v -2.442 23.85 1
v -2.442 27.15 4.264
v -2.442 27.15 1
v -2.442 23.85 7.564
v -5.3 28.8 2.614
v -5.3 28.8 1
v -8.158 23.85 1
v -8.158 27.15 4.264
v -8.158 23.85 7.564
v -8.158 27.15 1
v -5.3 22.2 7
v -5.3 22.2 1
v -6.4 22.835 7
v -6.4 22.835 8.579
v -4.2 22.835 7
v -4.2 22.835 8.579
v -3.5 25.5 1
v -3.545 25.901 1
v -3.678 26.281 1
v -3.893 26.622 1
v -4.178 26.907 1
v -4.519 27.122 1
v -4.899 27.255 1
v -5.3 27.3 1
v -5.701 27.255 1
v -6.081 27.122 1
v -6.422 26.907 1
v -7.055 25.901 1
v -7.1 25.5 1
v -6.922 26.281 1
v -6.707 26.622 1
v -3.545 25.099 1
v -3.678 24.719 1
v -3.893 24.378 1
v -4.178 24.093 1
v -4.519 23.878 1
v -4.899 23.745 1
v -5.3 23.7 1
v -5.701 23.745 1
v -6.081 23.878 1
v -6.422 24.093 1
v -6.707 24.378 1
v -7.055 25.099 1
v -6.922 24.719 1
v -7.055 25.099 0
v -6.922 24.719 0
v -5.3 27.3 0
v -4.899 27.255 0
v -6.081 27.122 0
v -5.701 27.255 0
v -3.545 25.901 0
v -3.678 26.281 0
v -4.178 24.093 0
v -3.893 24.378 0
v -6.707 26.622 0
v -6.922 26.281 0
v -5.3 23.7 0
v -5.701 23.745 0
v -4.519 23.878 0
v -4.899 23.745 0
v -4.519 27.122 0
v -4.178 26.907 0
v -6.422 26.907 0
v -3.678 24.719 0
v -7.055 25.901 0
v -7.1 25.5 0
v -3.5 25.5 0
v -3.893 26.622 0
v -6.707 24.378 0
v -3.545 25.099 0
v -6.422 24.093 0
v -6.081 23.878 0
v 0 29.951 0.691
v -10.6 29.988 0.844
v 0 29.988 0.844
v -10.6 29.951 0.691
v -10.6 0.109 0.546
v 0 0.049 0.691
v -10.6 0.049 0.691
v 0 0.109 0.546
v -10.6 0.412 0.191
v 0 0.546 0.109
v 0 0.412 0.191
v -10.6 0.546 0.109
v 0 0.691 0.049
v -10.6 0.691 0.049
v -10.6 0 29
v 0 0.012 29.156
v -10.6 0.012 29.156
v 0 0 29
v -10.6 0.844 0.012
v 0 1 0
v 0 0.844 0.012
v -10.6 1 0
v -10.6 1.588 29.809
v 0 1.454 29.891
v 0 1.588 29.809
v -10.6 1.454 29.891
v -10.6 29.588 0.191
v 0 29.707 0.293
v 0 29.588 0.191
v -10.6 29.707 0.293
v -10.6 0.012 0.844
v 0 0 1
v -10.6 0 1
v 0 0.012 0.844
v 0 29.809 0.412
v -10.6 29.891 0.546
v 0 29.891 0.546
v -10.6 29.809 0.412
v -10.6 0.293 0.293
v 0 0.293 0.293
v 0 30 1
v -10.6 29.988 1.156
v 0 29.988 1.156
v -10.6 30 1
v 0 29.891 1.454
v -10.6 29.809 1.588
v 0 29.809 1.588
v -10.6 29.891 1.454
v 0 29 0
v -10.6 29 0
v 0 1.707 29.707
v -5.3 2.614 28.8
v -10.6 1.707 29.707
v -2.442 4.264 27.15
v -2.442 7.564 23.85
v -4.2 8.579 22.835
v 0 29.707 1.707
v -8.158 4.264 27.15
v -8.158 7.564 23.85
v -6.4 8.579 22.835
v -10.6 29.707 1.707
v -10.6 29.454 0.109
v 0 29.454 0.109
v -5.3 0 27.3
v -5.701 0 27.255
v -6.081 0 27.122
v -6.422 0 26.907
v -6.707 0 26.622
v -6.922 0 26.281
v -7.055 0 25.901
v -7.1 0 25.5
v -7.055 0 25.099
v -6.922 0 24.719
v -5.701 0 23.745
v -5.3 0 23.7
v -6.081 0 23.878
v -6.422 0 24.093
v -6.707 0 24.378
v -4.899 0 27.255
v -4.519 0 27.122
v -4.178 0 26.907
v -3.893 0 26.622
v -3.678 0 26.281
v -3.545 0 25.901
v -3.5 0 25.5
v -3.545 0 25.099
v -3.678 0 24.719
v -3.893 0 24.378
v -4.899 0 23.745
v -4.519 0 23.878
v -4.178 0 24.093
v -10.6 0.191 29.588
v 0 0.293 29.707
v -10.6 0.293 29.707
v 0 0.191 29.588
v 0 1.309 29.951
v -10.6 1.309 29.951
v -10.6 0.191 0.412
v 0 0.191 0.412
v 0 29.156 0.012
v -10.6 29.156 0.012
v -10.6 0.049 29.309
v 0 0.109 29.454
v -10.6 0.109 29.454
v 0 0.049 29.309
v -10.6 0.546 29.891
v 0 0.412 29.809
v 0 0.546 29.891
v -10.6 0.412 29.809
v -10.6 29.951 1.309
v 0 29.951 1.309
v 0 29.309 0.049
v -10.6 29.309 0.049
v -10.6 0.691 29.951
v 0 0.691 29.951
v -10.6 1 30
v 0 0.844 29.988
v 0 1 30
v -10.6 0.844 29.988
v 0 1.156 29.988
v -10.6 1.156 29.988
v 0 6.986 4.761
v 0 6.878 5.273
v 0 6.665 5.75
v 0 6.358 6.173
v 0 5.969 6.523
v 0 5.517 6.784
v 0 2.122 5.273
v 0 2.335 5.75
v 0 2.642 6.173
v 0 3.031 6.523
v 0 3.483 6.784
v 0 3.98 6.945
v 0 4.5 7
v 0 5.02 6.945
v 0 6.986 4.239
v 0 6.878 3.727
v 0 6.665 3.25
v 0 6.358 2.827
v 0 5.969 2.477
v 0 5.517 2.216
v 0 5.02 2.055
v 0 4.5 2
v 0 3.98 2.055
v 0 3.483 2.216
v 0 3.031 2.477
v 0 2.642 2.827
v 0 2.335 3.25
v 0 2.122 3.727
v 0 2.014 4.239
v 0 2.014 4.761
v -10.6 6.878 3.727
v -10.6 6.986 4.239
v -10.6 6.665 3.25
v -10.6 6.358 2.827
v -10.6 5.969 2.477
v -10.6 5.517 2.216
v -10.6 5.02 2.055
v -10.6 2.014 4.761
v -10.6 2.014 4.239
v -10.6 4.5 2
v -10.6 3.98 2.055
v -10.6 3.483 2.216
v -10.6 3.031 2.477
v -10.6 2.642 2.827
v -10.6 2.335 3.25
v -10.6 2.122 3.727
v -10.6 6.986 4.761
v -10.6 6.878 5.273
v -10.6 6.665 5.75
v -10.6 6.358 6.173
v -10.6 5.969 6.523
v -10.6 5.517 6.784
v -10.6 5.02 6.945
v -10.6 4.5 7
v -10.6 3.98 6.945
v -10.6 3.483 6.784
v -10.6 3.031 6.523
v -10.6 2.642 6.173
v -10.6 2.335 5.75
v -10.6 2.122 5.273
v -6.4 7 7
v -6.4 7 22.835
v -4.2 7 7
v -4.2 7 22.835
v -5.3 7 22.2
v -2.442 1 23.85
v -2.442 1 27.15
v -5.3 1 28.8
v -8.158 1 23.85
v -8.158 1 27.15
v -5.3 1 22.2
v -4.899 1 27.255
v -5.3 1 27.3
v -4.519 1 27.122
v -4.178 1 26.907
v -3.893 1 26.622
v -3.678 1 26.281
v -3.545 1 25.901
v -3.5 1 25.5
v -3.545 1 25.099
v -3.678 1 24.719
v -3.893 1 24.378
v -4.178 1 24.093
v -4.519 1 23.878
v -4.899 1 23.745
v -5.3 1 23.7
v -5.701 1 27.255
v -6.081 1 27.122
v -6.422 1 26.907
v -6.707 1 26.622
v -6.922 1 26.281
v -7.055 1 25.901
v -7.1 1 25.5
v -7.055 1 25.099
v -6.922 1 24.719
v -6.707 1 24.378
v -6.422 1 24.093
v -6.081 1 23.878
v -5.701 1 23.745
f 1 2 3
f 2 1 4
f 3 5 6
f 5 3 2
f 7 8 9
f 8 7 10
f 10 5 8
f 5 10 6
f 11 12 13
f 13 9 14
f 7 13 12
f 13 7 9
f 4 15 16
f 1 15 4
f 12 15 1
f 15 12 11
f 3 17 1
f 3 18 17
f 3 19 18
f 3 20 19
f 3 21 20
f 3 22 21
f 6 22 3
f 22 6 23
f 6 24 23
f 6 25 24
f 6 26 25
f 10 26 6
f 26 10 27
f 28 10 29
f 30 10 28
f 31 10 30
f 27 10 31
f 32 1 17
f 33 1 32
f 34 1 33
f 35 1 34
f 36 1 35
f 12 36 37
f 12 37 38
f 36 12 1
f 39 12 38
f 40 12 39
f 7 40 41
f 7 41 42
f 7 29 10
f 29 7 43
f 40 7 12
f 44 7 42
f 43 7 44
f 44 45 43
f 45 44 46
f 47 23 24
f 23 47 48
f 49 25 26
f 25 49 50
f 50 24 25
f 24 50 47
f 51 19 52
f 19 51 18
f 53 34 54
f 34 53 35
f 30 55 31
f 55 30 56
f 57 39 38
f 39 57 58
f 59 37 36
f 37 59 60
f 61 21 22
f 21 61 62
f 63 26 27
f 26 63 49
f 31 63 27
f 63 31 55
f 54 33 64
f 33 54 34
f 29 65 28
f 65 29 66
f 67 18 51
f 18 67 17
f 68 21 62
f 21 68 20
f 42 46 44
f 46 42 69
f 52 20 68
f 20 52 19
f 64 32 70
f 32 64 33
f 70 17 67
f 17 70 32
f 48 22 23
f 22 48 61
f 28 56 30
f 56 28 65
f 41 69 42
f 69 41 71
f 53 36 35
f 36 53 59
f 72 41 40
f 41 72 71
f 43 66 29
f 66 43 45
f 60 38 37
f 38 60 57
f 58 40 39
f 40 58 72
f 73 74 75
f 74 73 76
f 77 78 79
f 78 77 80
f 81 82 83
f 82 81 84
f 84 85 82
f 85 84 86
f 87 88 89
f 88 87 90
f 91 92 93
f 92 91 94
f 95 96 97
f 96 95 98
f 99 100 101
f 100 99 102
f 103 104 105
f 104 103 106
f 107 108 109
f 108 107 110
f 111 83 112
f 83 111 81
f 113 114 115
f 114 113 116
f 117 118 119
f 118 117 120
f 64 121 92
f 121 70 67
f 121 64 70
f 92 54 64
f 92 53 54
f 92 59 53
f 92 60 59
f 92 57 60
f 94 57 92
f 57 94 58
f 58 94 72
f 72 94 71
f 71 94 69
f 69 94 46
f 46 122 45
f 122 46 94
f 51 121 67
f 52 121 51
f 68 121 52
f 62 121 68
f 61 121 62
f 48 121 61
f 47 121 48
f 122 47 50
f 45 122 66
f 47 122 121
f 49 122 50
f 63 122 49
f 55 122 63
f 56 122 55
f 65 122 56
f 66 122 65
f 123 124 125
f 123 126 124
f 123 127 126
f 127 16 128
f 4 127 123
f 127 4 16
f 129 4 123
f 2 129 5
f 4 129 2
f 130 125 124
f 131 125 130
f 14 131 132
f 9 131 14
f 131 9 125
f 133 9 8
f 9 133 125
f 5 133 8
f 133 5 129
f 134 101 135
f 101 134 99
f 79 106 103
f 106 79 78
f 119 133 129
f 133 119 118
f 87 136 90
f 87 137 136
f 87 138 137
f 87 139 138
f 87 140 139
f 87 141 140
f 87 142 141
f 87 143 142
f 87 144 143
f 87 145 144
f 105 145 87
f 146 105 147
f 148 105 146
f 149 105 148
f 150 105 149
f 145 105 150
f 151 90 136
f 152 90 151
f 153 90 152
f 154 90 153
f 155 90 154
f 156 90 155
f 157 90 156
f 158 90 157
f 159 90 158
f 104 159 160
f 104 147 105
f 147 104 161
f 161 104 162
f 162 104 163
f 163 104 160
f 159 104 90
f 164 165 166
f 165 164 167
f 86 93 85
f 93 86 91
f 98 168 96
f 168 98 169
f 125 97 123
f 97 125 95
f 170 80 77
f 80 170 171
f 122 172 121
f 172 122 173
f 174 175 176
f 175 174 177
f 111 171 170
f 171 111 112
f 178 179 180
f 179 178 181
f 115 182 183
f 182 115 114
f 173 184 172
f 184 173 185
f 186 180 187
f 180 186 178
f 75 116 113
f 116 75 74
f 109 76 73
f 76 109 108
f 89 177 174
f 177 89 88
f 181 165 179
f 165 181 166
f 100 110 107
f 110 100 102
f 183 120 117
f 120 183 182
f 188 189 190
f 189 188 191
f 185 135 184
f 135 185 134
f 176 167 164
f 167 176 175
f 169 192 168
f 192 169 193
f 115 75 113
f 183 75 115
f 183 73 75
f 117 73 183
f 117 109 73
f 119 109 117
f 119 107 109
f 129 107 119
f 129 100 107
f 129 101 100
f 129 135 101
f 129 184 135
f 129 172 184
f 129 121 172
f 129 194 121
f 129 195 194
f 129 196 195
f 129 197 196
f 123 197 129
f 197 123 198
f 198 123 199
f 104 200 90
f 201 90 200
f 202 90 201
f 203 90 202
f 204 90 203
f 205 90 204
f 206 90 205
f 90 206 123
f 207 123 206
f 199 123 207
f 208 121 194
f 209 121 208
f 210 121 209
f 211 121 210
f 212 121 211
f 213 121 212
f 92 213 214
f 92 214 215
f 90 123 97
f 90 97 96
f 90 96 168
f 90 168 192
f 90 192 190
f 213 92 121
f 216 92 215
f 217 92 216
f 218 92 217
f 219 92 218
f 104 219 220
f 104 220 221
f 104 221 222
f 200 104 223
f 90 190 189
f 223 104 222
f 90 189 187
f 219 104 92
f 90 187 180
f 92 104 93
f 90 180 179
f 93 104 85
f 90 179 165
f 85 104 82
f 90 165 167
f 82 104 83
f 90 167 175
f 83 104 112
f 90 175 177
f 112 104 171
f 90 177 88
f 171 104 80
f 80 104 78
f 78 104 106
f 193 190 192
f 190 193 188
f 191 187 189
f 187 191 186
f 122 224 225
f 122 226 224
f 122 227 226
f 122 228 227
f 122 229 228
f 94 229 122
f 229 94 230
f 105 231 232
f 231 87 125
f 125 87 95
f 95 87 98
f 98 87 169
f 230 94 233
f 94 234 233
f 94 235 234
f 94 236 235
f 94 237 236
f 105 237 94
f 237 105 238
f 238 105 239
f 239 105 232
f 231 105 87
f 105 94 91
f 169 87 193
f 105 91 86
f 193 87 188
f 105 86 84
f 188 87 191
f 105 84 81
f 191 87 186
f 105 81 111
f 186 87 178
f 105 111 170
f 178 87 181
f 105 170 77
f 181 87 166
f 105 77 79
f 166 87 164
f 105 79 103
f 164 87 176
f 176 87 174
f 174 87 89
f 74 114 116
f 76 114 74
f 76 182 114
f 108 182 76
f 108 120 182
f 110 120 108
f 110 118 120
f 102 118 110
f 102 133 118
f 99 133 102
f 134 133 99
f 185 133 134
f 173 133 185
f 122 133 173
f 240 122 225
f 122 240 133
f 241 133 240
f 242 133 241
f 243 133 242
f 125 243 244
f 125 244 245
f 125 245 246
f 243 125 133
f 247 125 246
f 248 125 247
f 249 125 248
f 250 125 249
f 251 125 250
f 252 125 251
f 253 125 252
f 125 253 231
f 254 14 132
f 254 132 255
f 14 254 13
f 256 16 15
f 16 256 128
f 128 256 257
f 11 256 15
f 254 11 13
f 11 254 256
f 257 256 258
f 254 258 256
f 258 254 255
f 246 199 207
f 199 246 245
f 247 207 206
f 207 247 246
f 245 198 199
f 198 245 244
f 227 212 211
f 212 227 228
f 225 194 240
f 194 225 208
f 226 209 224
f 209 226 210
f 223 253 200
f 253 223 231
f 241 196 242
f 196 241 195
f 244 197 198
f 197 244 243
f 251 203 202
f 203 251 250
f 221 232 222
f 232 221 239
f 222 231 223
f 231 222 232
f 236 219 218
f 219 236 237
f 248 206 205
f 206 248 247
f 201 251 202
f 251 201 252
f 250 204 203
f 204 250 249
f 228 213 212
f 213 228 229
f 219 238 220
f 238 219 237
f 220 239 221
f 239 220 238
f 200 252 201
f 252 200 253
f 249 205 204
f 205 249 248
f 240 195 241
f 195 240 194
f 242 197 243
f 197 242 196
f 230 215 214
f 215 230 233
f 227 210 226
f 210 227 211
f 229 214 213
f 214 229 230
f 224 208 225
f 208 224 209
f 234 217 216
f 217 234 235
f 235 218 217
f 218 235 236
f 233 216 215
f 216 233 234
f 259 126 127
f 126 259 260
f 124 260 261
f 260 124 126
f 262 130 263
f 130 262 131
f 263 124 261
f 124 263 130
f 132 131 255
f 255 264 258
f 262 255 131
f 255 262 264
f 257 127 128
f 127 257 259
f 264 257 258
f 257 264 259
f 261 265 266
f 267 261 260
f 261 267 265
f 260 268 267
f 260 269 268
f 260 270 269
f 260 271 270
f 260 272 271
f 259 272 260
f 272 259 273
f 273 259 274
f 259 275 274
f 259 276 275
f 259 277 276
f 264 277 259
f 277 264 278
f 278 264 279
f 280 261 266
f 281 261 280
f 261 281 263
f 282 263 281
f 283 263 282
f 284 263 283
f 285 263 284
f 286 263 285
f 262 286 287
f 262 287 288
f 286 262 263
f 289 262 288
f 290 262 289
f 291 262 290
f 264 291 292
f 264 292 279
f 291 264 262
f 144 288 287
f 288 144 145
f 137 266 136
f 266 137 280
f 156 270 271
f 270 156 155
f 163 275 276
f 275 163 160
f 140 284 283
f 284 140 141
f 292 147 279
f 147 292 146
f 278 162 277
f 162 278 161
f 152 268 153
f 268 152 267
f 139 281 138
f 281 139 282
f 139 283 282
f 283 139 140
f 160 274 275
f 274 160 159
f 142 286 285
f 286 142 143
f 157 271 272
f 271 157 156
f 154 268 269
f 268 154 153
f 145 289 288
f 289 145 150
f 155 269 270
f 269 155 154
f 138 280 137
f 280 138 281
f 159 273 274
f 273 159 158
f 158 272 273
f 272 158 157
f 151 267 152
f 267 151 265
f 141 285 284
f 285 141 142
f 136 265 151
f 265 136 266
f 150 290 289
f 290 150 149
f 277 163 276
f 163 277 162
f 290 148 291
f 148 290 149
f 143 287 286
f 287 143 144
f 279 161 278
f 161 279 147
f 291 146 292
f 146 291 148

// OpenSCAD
/* [Global] */
holdertype = "corner"; // [corner,side]

//The thickness of the glass
glass_thickness = 2.2;

//The width of the clamp
width = 30; 

//The size of the skrew
mountingholde = 5; 

// Nutsize of the glassplate thightner
nutsize = 6.6; 

//The size of the bolt
bolt_size = 3.6; 

//Wallthickess at the side of the glass
wallthickness = 2; 

/* [side holder] */
//Depth into the glassplate (Only for side holdertype)
dept = 15; 

/* [Hidden] */
totalthickness = glass_thickness + (2*wallthickness) < nutsize + (2*wallthickness) ? nutsize + (2*wallthickness) : glass_thickness + wallthickness;
actual_wallthickness = (totalthickness - glass_thickness) / 2;

module corner()
{
    rotate([0,-90,0])
    difference()
    {
        hull()
        {
            translate([width-1,1,0])
            cylinder(r=1,h=totalthickness,$fn=40);

            translate([1,1,0])
            cylinder(r=1,h=totalthickness,$fn=40);

            translate([1,width-1,0])
            cylinder(r=1,h=totalthickness,$fn=40);
        }
        
        translate([2+mountingholde,2+mountingholde,actual_wallthickness])
        cube([width,width,glass_thickness]);
        
        translate([2+mountingholde/2,2+mountingholde/2,-1])
        cylinder(r=mountingholde/2,h=20,$fn=30);

        translate([width-(2+mountingholde/2),width + 1,(totalthickness)/2])
        rotate([90,0,0])
        cylinder(r=nutsize/2,h=width,$fn=6);

        translate([width-(2+mountingholde/2),width/2,(totalthickness)/2])
        rotate([90,0,0])
        cylinder(r=bolt_size/2,h=width,$fn=28);


        mirror([1,0,0])
        rotate([0,0,90])
        {
            translate([width-(2+mountingholde/2),width + 1,(totalthickness)/2])
            rotate([90,0,0])
            cylinder(r=nutsize/2,h=width,$fn=6);

            translate([width-(2+mountingholde/2),width/2,(totalthickness)/2])
            rotate([90,0,0])
            cylinder(r=bolt_size/2,h=width,$fn=28);
        }
    }
}

module side()
{
    rotate([90,0,0])
    difference()
    {
        hull()
        {
            translate([width-1,1,0])
            cylinder(r=1,h=totalthickness,$fn=40);

            translate([width-1,dept-1,0])
            cylinder(r=1,h=totalthickness,$fn=40);

            translate([1,1,0])
            cylinder(r=1,h=totalthickness,$fn=40);

            translate([1,dept-1,0])
            cylinder(r=1,h=totalthickness,$fn=40);
        }
        
        translate([-0.1,2+mountingholde,actual_wallthickness])
        cube([width+1,width,glass_thickness]);
        
        translate([width/2,2+mountingholde/2,-1])
        cylinder(r=mountingholde/2,h=20,$fn=30);

        {
            translate([width-(2+mountingholde/2),width + 1,(totalthickness)/2])
            rotate([90,0,0])
            cylinder(r=nutsize/2,h=width,$fn=6);

            translate([width-(2+mountingholde/2),width/2,(totalthickness)/2])
            rotate([90,0,0])
            cylinder(r=bolt_size/2,h=width,$fn=28);
        }

        {
            translate([(2+mountingholde/2),width + 1,(totalthickness)/2])
            rotate([90,0,0])
            cylinder(r=nutsize/2,h=width,$fn=6);

            translate([(2+mountingholde/2),width/2,(totalthickness)/2])
            rotate([90,0,0])
            cylinder(r=bolt_size/2,h=width,$fn=28);
        }
    }
}

if(holdertype == "side")
{
    side();
}

if(holdertype == "corner")
{
    corner();
}
